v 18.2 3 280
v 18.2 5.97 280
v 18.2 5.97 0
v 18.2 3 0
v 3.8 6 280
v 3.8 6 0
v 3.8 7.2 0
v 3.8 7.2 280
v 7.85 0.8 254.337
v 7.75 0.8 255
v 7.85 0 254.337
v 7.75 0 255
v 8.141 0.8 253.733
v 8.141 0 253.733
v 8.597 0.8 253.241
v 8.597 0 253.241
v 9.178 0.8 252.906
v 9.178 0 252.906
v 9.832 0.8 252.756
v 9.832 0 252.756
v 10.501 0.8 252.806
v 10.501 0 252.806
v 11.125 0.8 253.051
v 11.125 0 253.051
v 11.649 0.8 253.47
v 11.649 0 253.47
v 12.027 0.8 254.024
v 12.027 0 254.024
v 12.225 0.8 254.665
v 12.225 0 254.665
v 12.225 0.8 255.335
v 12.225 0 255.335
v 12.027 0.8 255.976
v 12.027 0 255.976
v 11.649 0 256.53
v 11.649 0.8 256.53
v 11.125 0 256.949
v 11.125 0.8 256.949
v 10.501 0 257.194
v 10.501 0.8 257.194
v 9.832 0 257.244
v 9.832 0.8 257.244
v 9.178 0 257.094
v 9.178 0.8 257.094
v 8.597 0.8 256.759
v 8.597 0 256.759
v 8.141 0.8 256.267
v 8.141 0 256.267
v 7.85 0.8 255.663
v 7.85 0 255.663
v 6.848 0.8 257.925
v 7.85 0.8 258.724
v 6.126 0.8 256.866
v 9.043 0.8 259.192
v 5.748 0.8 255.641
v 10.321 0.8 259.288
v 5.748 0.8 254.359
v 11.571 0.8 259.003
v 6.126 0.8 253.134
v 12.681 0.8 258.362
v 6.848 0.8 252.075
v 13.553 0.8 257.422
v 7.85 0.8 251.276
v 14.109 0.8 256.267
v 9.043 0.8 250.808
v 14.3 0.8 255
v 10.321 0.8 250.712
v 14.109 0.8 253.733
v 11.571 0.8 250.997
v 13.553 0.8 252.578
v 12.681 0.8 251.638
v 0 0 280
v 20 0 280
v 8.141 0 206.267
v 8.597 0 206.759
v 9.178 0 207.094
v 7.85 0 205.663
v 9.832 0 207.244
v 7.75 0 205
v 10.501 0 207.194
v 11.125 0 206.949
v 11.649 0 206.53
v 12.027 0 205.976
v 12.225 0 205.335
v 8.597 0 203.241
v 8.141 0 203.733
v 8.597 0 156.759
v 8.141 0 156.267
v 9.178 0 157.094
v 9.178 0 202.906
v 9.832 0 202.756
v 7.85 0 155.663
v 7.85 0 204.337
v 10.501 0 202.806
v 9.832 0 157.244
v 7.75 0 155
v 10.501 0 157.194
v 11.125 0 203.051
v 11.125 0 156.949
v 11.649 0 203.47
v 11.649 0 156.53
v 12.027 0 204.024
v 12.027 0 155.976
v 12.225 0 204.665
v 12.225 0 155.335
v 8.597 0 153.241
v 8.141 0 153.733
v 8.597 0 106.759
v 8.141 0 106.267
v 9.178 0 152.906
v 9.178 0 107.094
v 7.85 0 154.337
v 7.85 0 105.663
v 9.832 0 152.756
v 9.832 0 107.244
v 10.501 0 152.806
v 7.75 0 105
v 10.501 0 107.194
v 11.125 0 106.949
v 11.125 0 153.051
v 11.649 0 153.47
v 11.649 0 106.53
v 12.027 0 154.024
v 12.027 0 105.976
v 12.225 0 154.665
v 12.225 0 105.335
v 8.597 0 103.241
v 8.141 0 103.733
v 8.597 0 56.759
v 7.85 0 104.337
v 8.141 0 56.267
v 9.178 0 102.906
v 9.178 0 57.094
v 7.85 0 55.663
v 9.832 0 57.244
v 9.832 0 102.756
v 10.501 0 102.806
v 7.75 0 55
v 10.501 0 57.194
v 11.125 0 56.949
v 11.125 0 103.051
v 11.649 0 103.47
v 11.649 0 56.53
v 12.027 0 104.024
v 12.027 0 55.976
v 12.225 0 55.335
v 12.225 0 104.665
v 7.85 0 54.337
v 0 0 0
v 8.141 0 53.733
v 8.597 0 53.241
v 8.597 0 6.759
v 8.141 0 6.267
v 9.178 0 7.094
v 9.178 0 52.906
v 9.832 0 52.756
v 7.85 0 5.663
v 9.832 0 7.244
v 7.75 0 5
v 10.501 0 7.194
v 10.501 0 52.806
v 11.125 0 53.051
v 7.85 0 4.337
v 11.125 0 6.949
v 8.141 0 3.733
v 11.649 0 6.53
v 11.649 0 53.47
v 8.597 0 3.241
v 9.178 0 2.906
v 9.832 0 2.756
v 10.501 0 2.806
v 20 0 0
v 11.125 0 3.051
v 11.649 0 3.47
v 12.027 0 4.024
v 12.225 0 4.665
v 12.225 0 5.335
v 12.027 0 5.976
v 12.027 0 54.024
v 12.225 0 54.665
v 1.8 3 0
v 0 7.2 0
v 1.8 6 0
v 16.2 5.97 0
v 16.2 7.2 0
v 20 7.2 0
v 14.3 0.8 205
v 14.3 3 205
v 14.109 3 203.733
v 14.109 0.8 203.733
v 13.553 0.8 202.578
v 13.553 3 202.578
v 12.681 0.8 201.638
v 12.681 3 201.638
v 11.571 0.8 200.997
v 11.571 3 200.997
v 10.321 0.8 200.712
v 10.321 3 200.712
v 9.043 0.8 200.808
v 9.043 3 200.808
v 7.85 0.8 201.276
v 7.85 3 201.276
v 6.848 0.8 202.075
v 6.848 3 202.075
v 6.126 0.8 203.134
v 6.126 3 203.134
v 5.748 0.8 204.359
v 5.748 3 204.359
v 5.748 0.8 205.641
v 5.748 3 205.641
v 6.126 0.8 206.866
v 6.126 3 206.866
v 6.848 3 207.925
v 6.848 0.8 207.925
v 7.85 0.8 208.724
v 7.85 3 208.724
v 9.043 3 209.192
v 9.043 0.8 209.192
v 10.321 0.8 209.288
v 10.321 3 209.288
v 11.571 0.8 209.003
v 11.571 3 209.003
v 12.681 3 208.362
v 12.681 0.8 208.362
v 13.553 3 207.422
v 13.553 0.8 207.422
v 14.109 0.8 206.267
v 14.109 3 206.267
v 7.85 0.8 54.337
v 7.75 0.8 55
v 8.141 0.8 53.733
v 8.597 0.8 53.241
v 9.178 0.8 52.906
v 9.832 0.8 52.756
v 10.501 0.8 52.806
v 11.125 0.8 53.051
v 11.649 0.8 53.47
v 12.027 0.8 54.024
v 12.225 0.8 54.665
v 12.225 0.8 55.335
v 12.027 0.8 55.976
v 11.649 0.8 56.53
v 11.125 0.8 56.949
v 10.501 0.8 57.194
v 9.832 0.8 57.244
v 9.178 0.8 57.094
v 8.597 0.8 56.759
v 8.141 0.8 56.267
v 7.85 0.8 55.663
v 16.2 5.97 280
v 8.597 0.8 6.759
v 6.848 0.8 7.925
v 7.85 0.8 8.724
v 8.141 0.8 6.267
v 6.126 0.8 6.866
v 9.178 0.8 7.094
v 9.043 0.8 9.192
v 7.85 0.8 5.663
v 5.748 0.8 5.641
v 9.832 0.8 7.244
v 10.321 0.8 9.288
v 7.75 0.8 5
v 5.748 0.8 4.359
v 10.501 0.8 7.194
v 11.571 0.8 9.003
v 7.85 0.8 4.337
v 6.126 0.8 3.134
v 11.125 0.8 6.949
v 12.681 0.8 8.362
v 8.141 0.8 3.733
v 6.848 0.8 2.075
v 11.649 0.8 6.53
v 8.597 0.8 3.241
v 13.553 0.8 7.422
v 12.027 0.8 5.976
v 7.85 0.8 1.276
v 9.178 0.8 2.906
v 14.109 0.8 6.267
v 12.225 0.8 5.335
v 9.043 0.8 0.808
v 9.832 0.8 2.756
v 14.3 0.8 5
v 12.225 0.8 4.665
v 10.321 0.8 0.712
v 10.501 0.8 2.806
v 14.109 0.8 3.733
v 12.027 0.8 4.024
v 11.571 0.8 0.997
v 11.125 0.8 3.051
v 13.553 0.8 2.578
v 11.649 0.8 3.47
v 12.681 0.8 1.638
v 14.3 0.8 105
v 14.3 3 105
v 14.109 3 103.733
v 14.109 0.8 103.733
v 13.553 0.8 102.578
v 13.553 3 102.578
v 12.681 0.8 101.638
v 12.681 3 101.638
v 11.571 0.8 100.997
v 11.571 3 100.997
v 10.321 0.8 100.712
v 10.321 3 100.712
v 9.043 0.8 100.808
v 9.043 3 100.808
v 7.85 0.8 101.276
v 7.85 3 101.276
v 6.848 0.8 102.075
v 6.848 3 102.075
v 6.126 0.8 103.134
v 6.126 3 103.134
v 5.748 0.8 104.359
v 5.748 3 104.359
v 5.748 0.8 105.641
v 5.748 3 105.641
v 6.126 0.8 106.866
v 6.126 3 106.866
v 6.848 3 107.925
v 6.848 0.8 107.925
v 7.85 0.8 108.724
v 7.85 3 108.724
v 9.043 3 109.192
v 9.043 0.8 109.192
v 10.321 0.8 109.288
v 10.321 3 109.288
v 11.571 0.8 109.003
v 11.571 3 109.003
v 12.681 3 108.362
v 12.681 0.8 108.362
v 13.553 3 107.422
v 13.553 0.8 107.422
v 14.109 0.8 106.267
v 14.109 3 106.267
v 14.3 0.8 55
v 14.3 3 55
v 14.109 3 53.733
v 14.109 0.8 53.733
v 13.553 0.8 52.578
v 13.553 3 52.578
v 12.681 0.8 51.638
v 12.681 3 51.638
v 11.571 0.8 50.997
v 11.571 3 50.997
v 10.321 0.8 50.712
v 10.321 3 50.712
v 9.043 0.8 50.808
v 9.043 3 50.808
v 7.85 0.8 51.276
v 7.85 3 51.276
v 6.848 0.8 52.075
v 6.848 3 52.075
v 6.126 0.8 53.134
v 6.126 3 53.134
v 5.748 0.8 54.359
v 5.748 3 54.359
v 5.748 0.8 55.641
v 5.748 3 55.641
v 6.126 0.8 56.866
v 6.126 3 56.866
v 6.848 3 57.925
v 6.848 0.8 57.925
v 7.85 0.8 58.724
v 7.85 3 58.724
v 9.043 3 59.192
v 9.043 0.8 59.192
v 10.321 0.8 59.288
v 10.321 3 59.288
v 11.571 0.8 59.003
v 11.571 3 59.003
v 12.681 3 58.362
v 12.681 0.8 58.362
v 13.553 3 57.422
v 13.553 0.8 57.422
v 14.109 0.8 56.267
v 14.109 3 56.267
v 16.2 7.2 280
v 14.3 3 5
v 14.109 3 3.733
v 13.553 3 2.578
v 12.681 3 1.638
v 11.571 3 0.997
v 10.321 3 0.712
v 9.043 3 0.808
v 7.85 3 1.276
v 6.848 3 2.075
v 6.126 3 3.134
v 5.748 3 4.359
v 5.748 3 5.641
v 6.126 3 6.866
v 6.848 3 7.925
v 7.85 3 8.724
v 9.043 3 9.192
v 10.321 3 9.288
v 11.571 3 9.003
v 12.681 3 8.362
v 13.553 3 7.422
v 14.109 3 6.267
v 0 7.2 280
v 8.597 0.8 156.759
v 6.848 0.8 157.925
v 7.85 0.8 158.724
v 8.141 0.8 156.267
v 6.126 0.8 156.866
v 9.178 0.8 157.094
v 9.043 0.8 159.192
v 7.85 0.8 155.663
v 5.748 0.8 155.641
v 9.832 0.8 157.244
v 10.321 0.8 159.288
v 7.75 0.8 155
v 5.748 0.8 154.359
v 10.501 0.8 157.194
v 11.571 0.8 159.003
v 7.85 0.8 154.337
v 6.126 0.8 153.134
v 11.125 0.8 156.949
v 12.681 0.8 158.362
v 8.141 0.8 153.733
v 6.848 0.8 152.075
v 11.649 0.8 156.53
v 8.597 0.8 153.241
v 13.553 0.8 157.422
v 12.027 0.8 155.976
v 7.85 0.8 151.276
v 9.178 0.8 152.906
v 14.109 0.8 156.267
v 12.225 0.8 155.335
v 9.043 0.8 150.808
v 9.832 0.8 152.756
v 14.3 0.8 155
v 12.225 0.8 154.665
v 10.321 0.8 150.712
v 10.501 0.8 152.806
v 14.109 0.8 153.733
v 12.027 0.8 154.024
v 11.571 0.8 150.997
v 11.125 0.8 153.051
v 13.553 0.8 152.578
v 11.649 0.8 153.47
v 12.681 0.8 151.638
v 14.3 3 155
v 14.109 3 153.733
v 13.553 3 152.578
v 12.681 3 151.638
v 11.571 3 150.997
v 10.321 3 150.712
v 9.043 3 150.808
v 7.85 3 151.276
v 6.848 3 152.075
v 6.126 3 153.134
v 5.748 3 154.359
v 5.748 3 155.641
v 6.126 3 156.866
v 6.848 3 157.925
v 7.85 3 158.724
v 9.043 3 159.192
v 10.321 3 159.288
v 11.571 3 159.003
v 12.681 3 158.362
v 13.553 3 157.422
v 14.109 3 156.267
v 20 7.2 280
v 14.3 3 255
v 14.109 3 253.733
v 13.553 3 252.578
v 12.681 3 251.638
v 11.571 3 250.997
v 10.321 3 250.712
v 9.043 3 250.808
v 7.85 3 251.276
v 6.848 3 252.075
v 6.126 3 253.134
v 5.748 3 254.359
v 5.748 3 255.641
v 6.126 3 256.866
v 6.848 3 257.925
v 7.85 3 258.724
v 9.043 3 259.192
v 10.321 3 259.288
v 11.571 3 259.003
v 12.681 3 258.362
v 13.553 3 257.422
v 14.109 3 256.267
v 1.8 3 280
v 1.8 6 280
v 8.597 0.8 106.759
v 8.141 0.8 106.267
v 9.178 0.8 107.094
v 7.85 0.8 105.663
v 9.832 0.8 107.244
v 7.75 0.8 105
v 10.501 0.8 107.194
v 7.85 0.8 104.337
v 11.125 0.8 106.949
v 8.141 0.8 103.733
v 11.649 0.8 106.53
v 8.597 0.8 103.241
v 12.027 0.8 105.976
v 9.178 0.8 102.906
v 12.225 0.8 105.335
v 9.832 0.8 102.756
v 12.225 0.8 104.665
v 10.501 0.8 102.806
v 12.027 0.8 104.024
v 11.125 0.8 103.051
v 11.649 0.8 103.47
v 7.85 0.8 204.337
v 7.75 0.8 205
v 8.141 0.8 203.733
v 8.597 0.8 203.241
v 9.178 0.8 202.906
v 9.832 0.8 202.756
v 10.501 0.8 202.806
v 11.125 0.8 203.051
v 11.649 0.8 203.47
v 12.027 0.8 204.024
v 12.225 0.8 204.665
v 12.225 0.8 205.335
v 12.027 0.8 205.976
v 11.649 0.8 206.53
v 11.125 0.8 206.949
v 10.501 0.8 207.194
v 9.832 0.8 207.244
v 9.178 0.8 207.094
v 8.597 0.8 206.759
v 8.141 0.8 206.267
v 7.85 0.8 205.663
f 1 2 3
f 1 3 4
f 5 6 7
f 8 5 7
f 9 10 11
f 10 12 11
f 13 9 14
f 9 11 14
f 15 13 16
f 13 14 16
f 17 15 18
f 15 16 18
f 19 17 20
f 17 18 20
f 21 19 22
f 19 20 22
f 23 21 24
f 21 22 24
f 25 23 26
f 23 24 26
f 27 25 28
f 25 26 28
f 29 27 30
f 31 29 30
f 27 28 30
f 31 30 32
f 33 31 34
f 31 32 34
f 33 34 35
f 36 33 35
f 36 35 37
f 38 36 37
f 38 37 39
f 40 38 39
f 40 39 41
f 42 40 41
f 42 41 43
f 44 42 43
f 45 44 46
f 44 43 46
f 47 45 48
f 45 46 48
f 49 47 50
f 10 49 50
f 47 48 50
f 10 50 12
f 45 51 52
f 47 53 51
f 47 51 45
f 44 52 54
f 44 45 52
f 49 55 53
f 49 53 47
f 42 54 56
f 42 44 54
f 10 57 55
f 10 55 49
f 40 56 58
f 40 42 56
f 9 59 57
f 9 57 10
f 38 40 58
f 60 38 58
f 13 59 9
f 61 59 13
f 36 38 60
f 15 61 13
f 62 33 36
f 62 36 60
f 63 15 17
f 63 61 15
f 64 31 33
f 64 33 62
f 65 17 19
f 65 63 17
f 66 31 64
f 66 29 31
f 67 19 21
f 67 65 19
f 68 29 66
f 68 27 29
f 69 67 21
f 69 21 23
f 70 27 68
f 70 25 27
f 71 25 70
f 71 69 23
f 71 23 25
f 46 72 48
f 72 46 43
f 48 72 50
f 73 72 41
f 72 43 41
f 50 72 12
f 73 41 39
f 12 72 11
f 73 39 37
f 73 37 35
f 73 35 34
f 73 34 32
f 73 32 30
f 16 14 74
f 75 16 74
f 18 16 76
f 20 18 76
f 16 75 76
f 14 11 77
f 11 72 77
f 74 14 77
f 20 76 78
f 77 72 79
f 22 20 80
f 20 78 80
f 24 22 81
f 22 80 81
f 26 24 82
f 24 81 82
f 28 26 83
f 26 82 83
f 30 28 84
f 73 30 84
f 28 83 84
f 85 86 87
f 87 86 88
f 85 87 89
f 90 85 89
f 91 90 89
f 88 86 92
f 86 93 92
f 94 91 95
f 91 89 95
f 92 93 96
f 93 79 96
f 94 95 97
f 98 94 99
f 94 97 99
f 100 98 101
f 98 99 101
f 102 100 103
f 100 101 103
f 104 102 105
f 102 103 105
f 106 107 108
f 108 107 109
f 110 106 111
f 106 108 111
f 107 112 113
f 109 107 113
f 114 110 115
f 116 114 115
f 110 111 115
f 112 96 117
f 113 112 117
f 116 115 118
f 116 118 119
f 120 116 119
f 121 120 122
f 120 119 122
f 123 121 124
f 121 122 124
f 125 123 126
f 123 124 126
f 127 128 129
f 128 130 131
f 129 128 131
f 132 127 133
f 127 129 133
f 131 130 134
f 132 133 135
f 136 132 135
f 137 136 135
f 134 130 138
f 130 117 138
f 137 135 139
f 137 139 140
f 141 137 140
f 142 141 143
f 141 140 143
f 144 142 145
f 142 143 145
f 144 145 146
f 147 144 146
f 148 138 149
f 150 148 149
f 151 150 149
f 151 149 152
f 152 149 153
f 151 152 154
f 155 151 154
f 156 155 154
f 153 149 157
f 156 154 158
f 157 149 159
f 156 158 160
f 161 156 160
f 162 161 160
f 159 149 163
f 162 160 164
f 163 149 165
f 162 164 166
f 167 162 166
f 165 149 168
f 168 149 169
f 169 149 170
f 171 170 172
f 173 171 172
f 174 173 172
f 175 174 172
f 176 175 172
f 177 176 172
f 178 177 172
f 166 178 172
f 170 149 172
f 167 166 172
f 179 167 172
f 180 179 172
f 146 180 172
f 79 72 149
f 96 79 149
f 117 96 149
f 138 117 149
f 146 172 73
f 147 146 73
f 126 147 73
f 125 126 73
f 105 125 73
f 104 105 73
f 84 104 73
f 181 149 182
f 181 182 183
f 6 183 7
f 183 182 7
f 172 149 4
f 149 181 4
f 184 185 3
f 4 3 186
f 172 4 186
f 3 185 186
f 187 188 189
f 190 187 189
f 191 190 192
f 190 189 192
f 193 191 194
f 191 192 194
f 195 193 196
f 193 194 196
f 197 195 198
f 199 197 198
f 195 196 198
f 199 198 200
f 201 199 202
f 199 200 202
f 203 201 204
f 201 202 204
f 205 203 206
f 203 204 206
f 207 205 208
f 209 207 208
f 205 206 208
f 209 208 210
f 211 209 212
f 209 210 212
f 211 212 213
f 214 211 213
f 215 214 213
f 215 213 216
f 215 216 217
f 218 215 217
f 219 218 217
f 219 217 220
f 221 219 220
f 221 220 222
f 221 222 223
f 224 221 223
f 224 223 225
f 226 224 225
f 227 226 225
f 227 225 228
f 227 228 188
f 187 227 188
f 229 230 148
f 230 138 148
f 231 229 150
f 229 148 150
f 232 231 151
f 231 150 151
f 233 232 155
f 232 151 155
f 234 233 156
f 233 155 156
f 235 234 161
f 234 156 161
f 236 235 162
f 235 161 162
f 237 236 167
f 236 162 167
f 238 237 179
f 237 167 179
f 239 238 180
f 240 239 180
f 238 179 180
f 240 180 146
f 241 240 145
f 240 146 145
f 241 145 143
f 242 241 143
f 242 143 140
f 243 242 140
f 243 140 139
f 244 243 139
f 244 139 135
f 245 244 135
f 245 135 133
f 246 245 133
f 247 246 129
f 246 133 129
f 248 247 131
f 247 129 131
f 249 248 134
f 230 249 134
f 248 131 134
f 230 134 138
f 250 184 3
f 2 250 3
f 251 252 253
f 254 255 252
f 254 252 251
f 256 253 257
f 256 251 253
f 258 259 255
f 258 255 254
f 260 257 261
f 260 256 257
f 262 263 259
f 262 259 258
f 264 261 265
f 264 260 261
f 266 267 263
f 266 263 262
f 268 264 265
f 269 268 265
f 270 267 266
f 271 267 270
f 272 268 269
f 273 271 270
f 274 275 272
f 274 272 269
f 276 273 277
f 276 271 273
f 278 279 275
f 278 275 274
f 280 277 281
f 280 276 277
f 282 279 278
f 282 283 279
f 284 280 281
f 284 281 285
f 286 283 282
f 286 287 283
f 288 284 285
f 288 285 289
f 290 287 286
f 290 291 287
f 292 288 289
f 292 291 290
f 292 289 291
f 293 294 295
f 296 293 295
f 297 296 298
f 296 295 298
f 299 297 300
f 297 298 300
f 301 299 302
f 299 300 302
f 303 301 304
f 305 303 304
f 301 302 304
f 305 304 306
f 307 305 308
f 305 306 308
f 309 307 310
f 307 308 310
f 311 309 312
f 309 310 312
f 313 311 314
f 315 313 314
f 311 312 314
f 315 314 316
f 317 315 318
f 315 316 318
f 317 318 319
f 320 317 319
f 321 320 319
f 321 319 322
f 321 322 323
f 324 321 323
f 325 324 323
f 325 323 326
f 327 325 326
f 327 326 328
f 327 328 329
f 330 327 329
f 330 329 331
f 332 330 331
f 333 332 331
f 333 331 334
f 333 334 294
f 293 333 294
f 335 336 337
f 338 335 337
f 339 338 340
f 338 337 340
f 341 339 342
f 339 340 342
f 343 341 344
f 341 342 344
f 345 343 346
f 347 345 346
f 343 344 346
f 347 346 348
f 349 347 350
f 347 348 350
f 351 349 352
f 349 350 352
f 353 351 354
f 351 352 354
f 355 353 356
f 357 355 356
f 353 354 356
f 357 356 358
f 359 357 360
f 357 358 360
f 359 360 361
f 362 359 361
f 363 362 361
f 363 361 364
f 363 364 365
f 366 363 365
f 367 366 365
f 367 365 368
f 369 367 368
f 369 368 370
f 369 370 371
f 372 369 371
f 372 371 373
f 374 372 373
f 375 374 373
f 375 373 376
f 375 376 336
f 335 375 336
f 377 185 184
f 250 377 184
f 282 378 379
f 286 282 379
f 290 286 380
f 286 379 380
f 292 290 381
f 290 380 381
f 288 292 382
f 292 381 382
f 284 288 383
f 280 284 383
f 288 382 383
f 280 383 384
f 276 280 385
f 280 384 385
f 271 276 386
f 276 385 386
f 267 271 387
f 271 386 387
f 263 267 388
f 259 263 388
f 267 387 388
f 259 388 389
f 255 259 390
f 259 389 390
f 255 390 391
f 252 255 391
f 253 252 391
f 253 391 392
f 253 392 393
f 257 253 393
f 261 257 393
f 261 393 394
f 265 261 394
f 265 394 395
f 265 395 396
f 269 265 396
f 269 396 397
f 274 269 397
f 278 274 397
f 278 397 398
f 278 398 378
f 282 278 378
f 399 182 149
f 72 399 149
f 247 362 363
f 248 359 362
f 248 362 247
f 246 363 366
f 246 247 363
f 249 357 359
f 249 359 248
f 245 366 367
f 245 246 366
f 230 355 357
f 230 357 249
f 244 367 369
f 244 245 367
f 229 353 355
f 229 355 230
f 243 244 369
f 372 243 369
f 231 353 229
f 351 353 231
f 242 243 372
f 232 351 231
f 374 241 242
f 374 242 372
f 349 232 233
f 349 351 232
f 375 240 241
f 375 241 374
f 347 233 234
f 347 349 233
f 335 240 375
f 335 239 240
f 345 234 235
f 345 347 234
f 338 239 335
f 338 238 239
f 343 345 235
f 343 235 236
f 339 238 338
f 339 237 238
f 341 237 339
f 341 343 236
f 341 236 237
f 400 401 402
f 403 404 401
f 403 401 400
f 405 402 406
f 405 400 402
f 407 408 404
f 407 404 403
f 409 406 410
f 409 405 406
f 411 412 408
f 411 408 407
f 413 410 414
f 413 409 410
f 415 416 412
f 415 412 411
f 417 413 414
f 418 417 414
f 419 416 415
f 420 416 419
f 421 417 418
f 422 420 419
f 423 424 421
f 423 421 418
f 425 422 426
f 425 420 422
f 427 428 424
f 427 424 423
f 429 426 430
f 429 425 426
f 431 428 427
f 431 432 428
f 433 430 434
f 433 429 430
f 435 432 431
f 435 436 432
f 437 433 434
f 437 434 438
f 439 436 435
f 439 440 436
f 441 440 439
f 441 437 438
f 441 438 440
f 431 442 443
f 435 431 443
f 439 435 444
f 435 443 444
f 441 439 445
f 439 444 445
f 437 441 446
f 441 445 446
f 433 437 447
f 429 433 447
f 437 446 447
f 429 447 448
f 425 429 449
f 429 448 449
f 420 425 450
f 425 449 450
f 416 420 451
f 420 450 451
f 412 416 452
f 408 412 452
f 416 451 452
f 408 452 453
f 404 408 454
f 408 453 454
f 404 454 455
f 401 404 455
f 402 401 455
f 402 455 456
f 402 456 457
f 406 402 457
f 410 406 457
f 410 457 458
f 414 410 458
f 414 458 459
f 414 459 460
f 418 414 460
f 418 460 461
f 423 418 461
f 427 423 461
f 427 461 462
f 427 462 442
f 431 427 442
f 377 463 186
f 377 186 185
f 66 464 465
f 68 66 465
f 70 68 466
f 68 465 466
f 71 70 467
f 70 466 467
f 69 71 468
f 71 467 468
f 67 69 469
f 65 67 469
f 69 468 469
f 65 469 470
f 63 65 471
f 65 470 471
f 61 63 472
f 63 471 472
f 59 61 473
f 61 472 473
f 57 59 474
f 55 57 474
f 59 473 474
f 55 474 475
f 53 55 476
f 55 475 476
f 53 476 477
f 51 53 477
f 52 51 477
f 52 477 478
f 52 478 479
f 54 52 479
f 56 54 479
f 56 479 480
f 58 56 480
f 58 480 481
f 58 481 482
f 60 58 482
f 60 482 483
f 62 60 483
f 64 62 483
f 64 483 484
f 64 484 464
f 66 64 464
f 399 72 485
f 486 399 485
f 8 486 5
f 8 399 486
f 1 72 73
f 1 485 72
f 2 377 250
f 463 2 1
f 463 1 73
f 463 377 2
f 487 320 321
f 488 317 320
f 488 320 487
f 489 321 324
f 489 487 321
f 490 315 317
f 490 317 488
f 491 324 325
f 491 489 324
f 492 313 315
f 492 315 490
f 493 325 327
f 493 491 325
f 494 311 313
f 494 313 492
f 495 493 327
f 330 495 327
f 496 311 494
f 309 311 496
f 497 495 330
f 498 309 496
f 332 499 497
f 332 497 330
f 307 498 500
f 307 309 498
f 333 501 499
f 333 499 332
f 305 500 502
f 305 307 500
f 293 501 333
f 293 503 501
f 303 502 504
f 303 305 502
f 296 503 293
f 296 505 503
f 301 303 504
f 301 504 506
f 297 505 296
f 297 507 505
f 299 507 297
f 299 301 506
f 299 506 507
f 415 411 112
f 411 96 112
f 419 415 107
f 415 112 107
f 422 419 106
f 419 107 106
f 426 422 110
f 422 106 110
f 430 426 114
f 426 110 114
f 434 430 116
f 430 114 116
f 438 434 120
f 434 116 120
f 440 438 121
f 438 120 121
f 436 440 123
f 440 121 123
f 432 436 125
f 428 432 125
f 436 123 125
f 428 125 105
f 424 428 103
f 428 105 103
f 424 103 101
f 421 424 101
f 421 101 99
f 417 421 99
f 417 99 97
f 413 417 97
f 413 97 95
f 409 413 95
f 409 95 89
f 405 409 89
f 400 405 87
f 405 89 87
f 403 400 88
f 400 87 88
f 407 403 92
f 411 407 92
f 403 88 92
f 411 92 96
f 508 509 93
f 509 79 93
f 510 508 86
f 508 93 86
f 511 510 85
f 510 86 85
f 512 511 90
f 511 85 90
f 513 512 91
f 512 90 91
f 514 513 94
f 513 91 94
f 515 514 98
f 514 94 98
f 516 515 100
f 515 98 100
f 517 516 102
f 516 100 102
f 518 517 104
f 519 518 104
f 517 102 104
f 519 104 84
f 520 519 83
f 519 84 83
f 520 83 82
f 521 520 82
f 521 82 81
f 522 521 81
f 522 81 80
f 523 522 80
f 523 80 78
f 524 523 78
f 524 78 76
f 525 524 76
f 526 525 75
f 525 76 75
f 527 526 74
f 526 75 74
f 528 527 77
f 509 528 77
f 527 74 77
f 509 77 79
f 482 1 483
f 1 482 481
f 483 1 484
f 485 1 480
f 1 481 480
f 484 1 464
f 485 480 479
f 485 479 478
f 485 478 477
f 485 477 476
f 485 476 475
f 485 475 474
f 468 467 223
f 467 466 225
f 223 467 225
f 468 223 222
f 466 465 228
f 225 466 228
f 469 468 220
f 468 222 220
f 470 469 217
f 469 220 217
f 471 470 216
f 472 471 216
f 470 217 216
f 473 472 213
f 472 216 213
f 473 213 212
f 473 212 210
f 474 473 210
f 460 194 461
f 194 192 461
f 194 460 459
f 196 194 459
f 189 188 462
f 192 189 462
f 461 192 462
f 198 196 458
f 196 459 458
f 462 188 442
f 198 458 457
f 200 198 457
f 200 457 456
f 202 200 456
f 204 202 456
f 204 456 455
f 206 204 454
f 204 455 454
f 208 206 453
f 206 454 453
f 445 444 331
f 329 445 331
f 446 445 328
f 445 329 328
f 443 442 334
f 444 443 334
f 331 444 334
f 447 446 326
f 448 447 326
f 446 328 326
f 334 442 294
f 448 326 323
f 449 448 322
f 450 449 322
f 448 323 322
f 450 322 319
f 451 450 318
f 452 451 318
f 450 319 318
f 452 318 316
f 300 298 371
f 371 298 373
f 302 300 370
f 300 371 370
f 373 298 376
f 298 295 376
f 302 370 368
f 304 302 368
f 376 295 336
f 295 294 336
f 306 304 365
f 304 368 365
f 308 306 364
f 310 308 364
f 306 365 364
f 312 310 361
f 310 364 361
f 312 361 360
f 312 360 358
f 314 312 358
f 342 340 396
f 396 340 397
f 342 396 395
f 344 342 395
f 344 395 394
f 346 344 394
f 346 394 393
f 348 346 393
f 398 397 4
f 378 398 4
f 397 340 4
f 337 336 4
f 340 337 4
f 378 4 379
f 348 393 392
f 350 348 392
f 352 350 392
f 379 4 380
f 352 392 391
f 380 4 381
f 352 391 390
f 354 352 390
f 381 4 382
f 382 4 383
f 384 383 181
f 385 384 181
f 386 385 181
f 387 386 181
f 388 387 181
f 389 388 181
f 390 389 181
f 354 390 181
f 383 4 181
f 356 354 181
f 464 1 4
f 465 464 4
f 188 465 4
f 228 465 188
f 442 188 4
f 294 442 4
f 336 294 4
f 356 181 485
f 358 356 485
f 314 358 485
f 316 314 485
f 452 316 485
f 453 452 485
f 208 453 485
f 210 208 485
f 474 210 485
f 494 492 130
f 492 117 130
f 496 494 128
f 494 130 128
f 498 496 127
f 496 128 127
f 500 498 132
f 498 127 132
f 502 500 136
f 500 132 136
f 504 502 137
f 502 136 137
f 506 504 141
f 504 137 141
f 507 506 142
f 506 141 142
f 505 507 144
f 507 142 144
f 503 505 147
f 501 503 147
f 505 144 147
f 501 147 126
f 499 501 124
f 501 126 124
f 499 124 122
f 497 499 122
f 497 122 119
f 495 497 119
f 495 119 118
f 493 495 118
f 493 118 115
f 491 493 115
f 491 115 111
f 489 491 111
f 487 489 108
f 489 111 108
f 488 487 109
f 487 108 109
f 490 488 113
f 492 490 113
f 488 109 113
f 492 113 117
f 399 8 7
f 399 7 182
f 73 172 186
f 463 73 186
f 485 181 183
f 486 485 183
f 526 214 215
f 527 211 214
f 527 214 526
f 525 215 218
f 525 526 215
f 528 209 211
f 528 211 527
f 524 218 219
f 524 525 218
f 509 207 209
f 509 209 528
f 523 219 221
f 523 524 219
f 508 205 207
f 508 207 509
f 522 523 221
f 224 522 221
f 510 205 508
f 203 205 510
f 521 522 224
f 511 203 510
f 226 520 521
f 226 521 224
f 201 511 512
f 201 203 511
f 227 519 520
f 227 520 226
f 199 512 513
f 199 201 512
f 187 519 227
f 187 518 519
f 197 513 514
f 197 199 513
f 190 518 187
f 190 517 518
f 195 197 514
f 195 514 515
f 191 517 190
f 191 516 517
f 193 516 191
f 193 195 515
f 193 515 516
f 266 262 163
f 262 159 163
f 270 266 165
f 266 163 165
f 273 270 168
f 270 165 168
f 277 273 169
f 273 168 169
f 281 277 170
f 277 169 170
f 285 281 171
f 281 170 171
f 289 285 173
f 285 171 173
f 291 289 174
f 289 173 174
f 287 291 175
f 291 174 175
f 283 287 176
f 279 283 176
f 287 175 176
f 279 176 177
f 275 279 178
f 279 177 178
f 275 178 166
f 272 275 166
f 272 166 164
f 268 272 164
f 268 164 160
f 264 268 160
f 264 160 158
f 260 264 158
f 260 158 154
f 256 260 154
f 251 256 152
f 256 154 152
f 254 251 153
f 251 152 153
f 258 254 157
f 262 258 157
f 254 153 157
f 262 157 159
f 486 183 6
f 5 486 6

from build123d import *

# Parameters (mm, degrees)
EXTRUDE_2_DEPTH              = 280
HOLE_WIZARD_M4_1_D           = 4.5
HOLE_WIZARD_M4_1_CBORE_D     = 8.6
HOLE_WIZARD_M4_1_CBORE_DEPTH = 2.2
HOLE_WIZARD_M4_3_D           = 4.5
HOLE_WIZARD_M4_3_CBORE_D     = 8.6
HOLE_WIZARD_M4_3_CBORE_DEPTH = 2.2


with BuildPart() as part:
    # ｽｹｯﾁ1 → ﾎﾞｽ - 押し出し2 (new body)
    with BuildSketch(Plane.XY):
        Polygon((0, 0), (20, 0), (20, 7.2), (16.2, 7.2), (16.2, 5.969681415), (18.2, 5.969681415), (18.2, 3), (1.8, 3), (1.8, 6), (3.8, 6), (3.8, 7.2), (0, 7.2), align=None)
    extrude(amount=EXTRUDE_2_DEPTH)

    # M4 丸押えねじ用座ぐり穴1 (through all)
    with Locations(Plane(origin=(0, 3, 0), x_dir=(1, 0, 0), z_dir=(0, 1, 0))):
        with Locations((10, -255), (10, -205), (10, -155), (10, -105), (10, -55)):
            CounterBoreHole(HOLE_WIZARD_M4_1_D / 2, HOLE_WIZARD_M4_1_CBORE_D / 2, HOLE_WIZARD_M4_1_CBORE_DEPTH)

    # M4 丸押えねじ用座ぐり穴3 (through all)
    with Locations(Plane(origin=(0, 3, 0), x_dir=(1, 0, 0), z_dir=(0, 1, 0))):
        with Locations((10, -5)):
            CounterBoreHole(HOLE_WIZARD_M4_3_D / 2, HOLE_WIZARD_M4_3_CBORE_D / 2, HOLE_WIZARD_M4_3_CBORE_DEPTH)


solid = part.part
